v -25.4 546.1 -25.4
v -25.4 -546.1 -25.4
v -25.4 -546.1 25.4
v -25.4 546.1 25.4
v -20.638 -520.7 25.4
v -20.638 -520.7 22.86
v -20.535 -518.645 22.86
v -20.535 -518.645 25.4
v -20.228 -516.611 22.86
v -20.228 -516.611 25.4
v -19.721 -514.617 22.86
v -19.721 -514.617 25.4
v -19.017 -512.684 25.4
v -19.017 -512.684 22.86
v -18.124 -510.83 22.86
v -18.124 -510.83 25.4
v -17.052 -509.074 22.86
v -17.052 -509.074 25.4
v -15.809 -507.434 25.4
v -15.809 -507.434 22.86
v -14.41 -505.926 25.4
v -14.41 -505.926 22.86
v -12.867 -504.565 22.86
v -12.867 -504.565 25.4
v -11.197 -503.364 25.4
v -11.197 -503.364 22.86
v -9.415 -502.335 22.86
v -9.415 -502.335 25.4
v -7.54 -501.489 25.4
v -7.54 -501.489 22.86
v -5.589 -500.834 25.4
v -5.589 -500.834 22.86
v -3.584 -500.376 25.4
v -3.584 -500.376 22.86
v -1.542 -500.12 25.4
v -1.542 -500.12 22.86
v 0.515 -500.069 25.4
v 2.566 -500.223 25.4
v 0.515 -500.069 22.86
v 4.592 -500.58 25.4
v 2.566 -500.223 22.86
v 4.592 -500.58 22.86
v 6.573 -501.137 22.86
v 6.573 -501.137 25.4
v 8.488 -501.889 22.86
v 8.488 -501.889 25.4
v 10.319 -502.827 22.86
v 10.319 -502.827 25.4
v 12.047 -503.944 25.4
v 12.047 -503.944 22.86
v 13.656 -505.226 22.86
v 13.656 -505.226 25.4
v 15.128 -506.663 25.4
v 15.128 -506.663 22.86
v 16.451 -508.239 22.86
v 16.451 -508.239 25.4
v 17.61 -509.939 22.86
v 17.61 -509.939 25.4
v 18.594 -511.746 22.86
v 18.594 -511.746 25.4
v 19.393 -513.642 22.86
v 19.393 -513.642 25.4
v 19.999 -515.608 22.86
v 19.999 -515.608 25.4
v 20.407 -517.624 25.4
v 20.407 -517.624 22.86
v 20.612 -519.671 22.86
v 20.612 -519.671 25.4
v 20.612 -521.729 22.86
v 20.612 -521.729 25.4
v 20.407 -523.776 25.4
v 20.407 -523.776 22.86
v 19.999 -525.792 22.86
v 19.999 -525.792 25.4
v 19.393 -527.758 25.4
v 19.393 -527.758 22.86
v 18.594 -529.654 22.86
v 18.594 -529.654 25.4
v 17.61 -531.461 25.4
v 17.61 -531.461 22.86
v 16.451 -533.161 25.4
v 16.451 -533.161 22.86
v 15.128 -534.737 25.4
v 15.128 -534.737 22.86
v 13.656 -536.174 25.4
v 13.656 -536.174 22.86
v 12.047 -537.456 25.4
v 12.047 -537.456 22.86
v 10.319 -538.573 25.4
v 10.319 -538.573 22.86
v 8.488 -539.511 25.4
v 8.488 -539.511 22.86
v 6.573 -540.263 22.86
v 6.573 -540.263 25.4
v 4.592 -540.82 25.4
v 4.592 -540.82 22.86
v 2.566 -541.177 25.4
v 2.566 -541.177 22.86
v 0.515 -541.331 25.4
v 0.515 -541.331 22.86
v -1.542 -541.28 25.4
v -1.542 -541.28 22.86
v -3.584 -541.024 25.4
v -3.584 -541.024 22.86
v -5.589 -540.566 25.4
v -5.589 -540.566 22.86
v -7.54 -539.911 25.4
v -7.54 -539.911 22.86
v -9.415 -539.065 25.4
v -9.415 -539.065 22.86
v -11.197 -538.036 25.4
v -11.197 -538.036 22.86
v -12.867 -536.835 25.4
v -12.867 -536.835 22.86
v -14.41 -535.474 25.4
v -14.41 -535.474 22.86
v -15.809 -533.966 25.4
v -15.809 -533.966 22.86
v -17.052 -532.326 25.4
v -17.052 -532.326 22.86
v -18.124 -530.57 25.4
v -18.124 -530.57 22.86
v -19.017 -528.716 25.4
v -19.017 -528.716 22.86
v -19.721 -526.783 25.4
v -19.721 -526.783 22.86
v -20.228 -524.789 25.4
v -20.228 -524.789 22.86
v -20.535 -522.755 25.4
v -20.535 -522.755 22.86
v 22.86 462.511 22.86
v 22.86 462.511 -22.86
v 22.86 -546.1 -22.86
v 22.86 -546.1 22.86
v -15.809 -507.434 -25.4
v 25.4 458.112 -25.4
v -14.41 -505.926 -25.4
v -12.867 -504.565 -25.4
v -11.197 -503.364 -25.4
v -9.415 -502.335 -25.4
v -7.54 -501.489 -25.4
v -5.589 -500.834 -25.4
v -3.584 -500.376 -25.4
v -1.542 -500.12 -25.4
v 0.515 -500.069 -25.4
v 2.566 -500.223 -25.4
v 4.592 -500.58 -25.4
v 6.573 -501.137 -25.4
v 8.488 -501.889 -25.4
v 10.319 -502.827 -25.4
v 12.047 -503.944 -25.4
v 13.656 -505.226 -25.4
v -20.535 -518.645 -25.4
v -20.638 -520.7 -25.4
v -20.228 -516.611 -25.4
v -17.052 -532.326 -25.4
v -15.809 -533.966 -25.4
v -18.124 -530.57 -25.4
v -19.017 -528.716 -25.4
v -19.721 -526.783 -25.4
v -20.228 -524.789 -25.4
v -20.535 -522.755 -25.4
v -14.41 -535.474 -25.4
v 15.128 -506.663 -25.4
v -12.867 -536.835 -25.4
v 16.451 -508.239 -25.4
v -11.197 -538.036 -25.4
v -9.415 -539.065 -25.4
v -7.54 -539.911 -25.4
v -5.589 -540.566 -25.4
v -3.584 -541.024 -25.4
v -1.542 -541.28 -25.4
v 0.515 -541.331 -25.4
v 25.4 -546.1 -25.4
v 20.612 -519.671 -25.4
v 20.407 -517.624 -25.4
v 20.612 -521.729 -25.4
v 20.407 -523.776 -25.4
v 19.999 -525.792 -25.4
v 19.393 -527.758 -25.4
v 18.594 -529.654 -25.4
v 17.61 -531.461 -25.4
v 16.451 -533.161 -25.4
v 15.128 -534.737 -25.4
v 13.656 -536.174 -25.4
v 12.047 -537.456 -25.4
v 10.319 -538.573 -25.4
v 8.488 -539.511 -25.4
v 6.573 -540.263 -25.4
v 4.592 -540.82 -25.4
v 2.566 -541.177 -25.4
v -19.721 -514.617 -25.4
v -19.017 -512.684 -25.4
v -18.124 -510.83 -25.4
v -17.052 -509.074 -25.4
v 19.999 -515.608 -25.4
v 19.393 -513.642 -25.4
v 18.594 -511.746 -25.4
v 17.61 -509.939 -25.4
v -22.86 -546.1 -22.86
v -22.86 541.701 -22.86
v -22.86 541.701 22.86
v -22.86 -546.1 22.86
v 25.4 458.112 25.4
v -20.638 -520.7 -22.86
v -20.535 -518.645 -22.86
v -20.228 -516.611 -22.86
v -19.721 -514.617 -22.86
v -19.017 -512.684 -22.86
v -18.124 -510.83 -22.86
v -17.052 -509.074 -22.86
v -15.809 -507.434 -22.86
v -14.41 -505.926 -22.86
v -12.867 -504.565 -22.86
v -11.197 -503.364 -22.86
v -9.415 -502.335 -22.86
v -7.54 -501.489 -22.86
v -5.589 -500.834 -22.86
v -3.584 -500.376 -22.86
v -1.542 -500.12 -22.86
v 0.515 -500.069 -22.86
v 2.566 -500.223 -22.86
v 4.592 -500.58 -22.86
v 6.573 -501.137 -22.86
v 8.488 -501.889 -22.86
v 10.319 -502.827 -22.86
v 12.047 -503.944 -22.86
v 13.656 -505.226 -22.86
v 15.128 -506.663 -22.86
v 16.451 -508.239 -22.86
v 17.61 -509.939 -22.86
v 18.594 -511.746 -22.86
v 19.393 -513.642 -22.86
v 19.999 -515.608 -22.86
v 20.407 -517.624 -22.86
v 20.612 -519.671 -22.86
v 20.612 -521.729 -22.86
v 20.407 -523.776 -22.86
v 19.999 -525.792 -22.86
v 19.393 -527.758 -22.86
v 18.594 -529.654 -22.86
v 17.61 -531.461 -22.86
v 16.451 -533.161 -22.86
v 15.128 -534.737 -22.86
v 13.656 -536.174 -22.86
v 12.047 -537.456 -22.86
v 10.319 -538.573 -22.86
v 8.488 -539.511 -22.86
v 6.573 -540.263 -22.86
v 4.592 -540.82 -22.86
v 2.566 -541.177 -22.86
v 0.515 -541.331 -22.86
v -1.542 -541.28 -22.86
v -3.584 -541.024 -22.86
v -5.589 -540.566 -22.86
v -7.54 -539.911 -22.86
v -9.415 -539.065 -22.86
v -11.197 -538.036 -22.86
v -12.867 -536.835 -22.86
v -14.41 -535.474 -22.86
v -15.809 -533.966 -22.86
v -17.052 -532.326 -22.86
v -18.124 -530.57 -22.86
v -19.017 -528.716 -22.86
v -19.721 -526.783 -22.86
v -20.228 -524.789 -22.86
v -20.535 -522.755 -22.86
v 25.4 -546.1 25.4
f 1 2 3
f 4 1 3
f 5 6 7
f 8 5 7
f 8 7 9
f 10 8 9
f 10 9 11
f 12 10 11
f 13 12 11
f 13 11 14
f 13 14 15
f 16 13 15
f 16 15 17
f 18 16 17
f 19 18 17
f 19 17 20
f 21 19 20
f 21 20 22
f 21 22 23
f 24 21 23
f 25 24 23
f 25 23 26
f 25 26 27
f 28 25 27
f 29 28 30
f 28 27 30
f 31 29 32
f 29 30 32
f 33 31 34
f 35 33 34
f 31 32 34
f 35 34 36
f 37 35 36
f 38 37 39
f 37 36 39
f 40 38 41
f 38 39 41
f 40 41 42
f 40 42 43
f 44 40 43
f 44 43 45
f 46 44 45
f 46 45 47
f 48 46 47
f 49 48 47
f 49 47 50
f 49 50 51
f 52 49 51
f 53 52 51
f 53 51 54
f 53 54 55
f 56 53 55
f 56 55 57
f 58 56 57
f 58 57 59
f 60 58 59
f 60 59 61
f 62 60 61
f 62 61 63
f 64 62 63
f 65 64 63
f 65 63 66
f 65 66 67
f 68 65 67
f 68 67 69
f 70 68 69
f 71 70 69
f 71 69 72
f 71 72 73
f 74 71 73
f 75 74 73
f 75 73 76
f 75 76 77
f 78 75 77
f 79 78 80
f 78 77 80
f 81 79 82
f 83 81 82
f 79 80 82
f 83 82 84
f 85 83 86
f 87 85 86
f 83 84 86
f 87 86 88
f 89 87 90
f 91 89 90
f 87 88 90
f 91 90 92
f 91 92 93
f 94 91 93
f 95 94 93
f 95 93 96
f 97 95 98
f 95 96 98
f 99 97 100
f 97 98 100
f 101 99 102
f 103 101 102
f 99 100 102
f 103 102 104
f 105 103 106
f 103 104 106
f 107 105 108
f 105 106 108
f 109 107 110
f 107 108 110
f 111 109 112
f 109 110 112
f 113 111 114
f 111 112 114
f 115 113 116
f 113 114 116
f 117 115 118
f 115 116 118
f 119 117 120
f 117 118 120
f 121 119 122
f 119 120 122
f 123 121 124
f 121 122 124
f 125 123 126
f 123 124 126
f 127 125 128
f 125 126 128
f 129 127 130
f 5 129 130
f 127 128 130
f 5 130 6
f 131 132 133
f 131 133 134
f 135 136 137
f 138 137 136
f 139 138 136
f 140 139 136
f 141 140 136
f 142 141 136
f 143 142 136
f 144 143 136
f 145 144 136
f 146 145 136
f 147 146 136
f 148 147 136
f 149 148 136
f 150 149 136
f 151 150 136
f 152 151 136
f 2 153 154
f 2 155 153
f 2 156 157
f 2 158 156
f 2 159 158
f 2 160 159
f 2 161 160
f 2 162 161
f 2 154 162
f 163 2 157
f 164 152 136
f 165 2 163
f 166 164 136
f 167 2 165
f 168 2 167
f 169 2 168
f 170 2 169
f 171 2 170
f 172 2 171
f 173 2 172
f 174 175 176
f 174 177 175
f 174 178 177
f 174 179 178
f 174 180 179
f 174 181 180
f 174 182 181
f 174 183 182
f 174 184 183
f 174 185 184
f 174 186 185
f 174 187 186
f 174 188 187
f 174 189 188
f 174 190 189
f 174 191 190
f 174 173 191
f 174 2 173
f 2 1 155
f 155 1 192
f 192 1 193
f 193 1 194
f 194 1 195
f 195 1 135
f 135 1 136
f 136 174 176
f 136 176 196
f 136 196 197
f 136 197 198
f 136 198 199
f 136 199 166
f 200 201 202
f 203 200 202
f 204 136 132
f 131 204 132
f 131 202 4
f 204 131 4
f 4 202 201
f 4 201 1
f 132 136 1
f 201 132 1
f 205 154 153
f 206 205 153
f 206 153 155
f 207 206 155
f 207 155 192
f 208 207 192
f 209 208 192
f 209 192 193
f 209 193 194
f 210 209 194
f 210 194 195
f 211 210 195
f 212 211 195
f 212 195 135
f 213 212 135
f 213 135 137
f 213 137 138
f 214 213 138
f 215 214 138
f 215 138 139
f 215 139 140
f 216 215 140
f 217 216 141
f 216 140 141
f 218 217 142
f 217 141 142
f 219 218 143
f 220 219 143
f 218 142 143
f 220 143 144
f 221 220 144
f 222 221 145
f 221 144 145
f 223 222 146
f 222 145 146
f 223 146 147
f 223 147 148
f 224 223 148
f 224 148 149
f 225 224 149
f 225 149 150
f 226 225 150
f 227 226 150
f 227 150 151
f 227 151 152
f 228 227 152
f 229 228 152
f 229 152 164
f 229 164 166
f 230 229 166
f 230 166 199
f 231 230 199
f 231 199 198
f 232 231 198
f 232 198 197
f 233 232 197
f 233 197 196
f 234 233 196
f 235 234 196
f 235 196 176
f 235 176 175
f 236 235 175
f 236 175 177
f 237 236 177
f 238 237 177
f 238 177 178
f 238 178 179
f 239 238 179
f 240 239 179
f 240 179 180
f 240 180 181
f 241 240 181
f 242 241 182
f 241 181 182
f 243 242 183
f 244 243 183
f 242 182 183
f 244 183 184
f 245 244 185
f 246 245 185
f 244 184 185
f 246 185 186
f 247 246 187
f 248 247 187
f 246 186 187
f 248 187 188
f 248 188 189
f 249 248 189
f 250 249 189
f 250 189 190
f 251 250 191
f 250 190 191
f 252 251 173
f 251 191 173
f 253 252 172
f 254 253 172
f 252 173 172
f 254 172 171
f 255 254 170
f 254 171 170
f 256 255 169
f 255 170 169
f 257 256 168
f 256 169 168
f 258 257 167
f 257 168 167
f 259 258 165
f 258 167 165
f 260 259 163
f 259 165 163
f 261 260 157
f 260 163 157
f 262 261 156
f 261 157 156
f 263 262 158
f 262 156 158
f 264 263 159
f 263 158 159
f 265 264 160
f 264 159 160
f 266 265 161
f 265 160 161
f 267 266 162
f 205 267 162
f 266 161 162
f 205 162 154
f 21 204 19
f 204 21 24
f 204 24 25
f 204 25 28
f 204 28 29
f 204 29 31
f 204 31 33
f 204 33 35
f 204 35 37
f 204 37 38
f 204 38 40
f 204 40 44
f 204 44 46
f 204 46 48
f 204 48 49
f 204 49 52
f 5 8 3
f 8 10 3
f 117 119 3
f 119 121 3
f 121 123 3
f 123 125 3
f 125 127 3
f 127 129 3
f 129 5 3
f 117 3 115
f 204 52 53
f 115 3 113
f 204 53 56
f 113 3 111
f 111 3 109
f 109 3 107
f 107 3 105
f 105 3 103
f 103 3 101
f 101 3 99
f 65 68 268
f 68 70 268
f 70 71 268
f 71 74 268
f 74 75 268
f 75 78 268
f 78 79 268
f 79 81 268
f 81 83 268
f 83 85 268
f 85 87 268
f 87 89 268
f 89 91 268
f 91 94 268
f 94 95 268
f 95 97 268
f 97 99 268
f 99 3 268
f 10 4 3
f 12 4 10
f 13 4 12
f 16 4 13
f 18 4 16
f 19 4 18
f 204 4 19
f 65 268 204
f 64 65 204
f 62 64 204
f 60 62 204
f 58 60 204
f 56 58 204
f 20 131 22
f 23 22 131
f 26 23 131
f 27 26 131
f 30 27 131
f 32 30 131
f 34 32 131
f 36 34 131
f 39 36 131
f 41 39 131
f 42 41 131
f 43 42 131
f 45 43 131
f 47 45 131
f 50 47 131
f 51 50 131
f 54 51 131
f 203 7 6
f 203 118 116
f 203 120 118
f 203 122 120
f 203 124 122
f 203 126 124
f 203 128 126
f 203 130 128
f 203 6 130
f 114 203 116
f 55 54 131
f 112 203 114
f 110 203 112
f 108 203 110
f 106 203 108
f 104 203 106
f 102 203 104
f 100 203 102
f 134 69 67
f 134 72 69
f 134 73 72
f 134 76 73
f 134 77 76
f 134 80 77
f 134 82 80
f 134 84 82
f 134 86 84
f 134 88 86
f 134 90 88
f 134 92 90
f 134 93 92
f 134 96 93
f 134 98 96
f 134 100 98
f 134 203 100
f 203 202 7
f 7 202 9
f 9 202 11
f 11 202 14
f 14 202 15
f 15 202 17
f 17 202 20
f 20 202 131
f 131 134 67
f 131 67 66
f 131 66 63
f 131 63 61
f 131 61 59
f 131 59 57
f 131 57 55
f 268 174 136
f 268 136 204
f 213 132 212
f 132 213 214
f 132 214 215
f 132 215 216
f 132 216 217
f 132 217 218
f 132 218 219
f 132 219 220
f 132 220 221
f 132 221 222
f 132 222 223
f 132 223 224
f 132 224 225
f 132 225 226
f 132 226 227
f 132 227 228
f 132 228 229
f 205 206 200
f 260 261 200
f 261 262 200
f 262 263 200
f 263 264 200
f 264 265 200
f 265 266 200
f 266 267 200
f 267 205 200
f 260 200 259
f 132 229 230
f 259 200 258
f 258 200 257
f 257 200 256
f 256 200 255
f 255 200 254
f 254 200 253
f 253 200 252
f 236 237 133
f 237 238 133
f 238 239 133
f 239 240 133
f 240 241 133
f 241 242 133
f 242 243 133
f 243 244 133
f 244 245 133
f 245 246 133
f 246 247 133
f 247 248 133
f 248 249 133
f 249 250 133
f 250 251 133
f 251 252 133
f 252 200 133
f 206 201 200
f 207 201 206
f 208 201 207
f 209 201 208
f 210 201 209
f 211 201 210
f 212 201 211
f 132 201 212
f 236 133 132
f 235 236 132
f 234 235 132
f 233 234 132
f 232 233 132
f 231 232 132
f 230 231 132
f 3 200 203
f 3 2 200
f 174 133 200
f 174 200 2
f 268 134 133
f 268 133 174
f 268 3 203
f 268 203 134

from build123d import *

# Parameters (mm, degrees)
F0_W        = 50.8
F0_H        = 50.8
F1_DEPTH    = 546.1
F2_T        = -2.54
F3_T1_DEPTH = 506.0659394114
F5_D        = 41.275


# Not quite as in the source:
# - a fillet or chamfer that OpenCascade refuses, or shapes differently, is made with other operations: its cross-section is extruded or revolved along the edge and cut away or added


with BuildPart() as f1:
    # F0 (on Front) → F1 (new body, symmetric)
    with BuildSketch(Plane.XZ):
        Rectangle(F0_W, F0_H)
    extrude(amount=F1_DEPTH, both=True)

    # F2
    f2_openings = [f1.faces().sort_by_distance(p)[0] for p in [
        (0, -546.1, 0),
        (0, 546.1, 0),
    ]]
    offset(amount=F2_T, openings=f2_openings)

    # F3: chamfer of 50.8 x 87.9881810245 on 1 edges, made by hand

    # F3_s2 → F3_t1 (cut)
    with BuildSketch(Plane.XY.offset(-253.0329697057)):
        Polygon((25.4, 458.1118189755), (-25.4, 546.1), (25.4, 546.1), align=None)
    extrude(amount=F3_T1_DEPTH, mode=Mode.SUBTRACT)

    # F5 (through all)
    with Locations(Plane.XY.offset(25.4)):
        with Locations((0, -520.7)):
            Hole(F5_D / 2)


solid = f1.part
